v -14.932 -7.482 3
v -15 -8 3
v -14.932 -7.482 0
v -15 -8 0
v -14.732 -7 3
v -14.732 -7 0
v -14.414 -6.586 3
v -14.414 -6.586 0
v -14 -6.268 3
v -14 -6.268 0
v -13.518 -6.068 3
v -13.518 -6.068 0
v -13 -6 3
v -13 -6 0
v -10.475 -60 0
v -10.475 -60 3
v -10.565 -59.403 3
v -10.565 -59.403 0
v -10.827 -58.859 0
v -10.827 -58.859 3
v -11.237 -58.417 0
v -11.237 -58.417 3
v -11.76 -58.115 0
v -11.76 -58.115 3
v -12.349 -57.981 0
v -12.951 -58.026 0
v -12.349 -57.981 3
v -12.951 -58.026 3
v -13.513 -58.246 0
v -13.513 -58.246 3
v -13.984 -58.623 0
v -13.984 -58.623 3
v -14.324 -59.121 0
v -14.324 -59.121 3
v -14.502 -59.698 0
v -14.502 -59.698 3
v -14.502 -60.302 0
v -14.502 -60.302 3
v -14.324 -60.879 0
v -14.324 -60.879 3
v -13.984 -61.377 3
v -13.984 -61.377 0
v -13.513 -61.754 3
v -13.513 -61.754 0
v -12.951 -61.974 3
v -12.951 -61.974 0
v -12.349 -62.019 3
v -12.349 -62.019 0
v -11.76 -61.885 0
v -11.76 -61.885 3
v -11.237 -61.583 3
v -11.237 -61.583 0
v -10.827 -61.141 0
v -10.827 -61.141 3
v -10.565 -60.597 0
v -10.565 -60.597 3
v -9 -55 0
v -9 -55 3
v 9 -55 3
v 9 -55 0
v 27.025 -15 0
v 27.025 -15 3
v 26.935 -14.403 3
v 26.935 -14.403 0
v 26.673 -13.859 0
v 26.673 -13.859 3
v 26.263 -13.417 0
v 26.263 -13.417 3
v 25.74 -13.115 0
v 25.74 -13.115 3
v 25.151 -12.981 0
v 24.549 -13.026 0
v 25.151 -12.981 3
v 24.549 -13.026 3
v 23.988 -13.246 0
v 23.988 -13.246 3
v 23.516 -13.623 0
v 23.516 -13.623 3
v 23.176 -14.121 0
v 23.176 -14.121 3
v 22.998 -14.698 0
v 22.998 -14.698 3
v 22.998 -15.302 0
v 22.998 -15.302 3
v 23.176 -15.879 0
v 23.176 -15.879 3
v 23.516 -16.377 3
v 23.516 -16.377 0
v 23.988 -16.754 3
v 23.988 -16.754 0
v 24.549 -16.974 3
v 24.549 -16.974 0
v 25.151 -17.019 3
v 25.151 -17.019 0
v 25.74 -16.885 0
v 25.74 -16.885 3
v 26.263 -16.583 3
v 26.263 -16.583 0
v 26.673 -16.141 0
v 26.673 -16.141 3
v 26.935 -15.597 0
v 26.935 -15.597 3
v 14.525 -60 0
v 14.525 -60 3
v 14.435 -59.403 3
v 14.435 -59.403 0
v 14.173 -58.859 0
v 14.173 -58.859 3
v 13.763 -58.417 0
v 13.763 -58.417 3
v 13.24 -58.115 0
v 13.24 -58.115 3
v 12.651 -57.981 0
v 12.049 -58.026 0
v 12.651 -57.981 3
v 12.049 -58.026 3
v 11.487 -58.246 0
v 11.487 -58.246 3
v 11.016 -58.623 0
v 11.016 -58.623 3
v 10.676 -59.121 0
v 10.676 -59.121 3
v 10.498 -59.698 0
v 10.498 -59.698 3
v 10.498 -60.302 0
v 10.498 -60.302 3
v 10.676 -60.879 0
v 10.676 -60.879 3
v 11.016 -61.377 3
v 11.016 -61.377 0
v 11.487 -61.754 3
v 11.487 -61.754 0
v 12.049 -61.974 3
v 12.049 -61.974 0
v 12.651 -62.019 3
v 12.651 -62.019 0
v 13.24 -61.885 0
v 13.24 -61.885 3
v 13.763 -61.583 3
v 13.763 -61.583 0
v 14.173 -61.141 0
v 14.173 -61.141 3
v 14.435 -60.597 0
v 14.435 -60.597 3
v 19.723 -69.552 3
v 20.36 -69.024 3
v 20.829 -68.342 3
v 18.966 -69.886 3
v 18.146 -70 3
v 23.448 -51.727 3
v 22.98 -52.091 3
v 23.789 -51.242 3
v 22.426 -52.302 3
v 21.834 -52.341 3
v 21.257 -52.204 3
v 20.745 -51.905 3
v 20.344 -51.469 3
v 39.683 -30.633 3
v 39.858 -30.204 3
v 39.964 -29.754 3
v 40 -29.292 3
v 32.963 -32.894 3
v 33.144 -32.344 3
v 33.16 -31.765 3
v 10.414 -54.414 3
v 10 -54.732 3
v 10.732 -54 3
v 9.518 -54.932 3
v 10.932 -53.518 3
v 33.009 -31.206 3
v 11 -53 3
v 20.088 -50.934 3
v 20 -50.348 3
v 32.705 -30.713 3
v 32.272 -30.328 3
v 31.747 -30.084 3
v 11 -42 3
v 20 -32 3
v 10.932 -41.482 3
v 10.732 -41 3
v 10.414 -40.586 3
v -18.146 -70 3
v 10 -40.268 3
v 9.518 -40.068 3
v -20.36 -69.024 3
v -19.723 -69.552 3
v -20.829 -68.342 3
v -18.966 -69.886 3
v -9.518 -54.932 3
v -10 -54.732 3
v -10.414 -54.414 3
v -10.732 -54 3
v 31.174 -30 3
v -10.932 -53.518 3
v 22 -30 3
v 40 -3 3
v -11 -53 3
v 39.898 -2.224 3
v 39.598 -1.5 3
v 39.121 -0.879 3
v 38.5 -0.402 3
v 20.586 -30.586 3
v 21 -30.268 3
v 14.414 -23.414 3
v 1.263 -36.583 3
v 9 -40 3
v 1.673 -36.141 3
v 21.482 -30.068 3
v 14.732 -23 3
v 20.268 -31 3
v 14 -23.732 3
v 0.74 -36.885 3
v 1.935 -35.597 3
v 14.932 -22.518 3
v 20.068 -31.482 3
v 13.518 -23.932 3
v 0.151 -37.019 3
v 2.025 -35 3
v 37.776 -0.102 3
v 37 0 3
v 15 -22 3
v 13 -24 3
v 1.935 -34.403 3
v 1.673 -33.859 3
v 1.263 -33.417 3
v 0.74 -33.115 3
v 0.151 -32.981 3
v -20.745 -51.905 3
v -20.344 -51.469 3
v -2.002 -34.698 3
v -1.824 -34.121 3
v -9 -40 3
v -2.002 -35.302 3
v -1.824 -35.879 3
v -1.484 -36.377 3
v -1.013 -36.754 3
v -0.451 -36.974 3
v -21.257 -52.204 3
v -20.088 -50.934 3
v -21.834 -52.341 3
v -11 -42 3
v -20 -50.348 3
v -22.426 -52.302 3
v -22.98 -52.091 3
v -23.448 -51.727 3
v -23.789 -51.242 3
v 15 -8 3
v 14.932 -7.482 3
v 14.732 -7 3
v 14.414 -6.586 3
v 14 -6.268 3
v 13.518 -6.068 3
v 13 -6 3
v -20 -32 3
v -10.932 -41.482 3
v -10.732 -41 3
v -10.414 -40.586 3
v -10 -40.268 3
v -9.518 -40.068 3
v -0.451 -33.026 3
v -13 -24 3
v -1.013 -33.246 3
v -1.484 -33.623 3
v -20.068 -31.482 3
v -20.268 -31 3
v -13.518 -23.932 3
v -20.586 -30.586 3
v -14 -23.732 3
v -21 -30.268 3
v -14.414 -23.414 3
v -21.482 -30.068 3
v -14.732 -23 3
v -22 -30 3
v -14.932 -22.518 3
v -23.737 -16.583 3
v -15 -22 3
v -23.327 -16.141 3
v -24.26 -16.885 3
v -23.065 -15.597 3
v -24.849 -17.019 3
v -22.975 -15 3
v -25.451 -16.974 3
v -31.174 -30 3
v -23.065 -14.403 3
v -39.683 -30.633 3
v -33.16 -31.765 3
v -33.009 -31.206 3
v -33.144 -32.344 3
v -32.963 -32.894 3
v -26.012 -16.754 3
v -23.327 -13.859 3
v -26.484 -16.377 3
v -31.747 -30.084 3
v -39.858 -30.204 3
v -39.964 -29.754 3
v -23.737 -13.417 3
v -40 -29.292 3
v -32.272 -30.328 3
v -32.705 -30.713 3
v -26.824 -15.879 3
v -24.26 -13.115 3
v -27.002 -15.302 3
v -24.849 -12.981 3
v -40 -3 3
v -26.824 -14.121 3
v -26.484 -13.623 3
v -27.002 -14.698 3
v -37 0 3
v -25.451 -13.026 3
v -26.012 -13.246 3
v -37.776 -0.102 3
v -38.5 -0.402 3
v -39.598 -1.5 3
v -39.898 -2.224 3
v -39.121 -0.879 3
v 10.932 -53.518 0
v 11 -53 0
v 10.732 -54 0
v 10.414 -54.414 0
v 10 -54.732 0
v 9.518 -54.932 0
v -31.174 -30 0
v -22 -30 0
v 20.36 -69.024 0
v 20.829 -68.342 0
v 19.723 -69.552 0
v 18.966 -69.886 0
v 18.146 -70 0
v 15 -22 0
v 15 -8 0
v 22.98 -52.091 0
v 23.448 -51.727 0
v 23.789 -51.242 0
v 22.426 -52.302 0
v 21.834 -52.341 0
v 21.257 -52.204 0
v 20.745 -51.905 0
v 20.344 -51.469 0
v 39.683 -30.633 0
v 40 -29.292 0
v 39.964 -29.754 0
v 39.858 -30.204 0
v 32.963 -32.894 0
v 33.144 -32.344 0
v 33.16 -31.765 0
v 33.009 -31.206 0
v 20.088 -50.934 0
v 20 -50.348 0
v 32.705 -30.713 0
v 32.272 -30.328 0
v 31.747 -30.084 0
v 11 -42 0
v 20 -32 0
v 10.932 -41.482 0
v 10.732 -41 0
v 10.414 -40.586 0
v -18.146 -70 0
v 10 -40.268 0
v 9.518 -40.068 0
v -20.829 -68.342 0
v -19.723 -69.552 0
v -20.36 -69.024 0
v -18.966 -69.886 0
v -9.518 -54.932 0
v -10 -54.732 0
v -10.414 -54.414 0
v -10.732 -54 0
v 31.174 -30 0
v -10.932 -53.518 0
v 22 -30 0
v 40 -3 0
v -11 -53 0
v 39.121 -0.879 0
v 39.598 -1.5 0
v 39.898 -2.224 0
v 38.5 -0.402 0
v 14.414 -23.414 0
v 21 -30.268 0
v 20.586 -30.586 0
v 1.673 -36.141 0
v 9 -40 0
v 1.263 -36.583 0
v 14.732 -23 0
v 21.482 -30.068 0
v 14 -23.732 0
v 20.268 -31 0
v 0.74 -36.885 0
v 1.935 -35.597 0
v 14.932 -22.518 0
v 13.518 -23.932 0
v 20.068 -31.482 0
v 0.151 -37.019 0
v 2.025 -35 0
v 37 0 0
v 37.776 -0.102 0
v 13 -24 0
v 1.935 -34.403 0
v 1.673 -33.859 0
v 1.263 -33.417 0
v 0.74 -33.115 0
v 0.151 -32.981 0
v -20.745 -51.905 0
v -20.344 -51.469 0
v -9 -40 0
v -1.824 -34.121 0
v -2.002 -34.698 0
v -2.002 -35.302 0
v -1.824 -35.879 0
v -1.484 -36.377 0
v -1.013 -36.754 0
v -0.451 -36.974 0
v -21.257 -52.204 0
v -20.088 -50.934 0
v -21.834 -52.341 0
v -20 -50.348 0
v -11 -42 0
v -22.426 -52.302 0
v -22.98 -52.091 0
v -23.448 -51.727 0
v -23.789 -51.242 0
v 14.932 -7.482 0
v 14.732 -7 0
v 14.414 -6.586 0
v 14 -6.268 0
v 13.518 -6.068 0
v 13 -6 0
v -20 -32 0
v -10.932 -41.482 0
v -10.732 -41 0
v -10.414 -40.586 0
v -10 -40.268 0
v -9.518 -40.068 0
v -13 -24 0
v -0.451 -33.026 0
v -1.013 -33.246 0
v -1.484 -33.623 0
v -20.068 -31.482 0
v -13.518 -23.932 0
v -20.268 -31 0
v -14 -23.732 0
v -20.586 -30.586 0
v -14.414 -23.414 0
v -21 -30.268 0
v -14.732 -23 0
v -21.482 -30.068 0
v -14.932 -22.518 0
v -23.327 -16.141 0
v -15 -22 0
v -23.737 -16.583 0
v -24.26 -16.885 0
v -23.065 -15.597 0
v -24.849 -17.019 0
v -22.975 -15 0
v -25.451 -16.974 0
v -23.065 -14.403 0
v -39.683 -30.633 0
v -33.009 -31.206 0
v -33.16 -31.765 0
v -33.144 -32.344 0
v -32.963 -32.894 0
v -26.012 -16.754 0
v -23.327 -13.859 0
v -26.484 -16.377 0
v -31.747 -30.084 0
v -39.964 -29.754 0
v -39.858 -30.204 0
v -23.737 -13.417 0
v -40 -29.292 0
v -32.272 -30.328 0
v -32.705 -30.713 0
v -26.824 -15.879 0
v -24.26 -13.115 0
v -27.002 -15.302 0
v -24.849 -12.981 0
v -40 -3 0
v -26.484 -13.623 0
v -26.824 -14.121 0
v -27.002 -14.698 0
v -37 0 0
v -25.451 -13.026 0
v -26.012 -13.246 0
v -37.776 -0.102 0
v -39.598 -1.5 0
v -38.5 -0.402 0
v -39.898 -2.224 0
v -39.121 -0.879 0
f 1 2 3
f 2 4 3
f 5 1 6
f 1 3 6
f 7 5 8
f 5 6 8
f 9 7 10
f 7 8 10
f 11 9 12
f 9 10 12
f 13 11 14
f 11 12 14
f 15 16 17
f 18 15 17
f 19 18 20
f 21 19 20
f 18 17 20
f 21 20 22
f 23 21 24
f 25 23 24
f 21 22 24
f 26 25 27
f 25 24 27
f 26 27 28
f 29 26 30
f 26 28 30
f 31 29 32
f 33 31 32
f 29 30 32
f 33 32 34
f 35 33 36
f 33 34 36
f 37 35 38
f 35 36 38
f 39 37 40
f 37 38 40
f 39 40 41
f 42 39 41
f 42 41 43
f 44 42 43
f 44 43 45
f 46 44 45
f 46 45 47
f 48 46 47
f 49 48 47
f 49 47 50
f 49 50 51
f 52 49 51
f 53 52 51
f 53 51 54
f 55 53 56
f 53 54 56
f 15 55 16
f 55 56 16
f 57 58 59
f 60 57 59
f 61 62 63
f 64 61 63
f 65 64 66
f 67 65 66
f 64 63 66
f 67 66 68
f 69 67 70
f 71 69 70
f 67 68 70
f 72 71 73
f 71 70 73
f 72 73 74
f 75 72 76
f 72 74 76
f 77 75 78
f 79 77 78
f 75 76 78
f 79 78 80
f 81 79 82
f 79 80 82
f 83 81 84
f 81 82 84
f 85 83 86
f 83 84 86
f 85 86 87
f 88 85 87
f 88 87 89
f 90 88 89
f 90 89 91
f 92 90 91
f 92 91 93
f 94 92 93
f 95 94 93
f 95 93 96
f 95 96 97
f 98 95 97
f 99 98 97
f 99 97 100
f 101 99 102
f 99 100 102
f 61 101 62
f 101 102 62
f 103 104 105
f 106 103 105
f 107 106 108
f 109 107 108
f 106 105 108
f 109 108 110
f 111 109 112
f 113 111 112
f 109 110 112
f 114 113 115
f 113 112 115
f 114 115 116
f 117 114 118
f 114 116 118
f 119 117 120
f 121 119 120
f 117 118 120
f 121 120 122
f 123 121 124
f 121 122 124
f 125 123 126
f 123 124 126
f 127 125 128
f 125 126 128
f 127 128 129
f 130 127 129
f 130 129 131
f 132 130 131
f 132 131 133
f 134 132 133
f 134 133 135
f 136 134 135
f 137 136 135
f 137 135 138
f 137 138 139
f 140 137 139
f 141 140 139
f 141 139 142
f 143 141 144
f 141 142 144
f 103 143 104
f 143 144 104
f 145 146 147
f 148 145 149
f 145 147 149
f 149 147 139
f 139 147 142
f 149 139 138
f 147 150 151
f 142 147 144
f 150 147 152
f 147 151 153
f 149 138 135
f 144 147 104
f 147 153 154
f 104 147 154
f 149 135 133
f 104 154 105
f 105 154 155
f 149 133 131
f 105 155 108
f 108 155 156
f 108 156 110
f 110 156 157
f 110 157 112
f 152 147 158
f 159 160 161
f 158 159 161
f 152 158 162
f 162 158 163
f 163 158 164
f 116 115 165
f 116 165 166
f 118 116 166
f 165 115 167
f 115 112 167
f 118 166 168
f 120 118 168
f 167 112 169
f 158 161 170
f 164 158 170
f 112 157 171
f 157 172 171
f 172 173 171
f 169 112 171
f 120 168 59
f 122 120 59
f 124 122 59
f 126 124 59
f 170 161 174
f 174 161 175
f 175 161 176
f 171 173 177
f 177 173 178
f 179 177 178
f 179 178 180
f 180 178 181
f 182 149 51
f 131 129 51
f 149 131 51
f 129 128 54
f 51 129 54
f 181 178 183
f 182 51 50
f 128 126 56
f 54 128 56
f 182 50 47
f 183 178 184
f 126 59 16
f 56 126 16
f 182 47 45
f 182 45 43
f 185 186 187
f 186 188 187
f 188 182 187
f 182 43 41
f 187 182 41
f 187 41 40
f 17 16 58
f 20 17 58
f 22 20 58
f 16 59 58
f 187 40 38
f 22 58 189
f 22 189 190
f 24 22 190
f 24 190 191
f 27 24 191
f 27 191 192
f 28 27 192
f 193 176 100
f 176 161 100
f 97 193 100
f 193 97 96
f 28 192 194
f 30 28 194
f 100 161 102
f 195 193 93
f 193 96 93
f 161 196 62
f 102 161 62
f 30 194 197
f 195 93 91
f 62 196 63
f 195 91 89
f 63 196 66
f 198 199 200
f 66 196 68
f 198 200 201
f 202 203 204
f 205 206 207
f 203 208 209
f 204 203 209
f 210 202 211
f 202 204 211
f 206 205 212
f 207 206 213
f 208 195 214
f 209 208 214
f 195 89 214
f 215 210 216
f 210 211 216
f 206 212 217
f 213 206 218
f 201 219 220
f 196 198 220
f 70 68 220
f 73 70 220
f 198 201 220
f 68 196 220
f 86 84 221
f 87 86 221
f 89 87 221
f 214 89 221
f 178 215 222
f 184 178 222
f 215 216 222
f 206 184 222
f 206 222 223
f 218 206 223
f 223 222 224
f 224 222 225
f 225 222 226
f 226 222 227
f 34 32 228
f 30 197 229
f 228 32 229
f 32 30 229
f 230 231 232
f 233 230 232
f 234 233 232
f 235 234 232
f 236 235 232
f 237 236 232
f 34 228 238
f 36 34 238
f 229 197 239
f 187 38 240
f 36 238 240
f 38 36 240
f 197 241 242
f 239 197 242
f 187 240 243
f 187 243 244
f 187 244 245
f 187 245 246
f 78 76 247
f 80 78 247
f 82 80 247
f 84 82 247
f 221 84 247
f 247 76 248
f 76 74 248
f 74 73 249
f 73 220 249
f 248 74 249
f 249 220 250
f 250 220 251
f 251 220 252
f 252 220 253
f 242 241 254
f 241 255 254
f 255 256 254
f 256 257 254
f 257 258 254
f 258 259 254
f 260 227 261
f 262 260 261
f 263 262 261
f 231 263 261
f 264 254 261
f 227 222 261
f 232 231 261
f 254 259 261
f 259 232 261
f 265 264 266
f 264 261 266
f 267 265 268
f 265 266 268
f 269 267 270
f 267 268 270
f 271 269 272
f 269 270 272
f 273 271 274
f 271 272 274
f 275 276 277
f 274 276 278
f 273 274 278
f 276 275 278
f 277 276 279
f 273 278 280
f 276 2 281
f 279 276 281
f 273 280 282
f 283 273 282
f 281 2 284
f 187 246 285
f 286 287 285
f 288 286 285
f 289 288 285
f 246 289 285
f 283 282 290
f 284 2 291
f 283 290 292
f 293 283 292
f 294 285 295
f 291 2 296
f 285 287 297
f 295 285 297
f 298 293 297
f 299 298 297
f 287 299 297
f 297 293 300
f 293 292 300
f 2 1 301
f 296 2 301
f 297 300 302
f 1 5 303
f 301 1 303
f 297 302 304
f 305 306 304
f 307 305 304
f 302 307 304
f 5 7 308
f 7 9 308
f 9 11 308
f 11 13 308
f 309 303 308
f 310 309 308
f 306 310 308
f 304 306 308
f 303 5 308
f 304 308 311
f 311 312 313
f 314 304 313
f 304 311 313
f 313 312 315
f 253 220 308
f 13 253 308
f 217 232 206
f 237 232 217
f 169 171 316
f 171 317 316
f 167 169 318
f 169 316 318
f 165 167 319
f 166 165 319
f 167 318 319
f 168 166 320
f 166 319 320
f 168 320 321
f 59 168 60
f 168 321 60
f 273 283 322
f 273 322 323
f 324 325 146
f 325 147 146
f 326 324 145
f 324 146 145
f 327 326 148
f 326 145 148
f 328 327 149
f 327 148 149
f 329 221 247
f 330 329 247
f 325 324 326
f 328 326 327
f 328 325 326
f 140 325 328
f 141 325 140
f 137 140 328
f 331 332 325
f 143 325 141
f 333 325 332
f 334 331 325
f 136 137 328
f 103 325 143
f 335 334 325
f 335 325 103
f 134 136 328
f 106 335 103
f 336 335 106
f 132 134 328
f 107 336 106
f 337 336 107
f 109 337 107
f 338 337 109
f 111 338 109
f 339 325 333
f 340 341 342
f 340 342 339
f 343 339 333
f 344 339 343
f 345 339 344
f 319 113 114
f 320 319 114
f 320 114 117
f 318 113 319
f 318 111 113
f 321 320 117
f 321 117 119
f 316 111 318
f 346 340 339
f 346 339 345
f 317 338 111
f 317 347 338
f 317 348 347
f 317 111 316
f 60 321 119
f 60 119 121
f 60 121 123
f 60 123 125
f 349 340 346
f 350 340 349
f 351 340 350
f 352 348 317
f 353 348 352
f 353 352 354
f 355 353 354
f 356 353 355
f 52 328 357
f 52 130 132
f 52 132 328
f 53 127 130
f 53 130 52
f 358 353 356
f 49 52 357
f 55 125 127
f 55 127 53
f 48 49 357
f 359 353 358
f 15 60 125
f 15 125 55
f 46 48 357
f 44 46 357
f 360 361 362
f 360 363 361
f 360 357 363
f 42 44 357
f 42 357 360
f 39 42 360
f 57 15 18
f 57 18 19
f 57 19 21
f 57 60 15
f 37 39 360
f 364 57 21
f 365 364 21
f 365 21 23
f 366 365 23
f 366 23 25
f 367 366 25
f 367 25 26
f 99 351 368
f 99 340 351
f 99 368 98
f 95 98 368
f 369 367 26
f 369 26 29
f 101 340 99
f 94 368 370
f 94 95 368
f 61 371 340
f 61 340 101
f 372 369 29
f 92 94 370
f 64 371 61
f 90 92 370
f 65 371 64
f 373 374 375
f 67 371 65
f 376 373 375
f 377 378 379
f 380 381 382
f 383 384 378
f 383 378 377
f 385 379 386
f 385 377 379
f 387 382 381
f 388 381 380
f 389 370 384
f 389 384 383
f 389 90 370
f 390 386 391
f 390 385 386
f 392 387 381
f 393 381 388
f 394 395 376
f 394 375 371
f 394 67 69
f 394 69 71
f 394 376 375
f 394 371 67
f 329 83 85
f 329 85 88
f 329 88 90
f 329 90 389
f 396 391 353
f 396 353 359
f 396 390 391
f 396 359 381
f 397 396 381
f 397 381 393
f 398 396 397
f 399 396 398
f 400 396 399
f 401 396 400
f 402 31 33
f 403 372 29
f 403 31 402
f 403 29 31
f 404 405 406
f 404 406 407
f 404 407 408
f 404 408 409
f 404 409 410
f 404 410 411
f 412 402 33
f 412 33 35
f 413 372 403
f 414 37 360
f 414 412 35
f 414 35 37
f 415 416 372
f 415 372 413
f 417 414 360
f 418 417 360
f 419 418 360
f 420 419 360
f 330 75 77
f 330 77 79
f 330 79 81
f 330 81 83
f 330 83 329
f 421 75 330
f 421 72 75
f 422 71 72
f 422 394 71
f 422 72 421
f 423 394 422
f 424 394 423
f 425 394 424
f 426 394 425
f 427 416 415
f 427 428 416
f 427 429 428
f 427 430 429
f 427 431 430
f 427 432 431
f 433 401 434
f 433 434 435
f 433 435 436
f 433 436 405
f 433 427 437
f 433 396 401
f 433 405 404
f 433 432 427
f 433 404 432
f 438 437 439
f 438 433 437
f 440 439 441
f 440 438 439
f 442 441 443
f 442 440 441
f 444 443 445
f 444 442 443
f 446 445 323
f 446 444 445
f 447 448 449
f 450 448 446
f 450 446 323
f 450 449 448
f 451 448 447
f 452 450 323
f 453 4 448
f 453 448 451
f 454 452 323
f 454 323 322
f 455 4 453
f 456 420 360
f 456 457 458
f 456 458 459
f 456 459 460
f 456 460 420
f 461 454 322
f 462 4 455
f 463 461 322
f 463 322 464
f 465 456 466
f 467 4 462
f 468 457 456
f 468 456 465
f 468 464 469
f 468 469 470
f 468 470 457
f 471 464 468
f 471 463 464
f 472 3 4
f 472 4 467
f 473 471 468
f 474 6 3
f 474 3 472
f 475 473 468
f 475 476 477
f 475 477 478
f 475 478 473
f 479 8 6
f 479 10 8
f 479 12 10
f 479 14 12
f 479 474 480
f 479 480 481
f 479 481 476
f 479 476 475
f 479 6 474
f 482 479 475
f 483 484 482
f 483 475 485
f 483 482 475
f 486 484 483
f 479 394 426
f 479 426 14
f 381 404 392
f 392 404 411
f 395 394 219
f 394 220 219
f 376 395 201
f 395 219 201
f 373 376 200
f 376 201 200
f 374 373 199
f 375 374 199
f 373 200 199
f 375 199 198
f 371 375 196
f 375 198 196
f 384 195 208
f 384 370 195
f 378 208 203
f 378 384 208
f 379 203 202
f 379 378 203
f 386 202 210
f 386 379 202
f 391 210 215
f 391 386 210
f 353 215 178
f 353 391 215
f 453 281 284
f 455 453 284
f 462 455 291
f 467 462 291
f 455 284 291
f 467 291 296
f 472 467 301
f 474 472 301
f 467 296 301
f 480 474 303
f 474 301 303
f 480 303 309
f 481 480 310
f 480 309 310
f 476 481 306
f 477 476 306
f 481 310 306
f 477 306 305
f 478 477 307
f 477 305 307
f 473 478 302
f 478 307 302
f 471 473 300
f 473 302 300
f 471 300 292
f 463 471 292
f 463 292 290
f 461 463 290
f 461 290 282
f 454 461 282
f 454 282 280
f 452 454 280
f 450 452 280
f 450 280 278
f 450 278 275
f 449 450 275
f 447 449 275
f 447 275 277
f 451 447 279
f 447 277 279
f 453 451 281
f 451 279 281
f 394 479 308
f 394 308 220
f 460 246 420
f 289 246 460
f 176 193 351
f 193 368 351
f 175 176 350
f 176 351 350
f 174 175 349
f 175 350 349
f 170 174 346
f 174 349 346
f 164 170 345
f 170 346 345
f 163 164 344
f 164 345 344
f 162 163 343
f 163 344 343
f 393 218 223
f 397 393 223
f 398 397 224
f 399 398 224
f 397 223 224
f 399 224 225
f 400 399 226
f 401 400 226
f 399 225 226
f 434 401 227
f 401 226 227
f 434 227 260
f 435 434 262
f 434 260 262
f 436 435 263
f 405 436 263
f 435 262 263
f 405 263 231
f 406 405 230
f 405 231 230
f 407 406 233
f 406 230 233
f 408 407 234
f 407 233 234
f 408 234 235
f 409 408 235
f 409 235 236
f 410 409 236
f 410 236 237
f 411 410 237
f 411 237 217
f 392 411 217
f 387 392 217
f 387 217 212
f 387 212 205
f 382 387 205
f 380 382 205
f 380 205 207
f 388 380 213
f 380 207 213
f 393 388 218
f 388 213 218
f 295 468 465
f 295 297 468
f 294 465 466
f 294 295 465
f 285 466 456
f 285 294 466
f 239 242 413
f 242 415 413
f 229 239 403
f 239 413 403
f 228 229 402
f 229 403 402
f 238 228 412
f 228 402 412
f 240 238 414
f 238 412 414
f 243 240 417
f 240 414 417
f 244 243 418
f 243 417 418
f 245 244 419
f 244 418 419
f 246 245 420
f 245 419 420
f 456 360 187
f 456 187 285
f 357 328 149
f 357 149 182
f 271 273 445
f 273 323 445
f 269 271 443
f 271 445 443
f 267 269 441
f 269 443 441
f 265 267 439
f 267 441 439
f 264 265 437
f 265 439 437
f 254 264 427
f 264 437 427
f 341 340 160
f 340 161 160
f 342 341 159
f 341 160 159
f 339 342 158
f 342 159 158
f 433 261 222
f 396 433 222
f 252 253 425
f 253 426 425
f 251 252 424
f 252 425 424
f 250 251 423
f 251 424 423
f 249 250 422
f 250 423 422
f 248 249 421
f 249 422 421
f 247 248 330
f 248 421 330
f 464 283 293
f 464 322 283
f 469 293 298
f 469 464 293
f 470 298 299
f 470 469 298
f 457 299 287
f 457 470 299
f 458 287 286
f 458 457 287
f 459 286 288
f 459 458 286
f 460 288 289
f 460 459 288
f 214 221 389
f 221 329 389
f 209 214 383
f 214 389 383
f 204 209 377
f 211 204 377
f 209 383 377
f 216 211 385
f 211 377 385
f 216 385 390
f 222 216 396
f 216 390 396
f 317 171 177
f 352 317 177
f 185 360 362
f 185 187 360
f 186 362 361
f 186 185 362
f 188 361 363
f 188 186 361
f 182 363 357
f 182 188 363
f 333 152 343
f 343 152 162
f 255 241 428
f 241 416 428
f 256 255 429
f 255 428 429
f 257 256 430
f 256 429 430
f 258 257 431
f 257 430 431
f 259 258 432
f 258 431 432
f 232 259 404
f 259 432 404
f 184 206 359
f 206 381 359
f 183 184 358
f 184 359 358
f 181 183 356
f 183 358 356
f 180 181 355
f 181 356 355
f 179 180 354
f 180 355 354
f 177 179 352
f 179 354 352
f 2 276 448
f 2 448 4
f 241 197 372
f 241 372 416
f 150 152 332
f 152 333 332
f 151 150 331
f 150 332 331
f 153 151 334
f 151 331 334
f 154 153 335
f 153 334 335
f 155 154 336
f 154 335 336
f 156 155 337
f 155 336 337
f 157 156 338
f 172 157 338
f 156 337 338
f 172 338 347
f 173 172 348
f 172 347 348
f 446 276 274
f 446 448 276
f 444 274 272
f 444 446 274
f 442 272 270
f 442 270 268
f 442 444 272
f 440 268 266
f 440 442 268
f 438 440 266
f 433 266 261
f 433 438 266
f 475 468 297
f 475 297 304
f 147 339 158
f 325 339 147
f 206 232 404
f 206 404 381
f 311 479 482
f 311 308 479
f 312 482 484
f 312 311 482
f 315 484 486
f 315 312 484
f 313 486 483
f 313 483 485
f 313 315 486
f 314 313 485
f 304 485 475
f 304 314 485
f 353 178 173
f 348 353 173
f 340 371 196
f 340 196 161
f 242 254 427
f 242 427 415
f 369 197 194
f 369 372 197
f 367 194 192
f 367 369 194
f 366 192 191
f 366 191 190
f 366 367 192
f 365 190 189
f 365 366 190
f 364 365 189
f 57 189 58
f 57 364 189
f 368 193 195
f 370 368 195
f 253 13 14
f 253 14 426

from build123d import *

# Parameters (mm, degrees)
EXTRUDE_1_DEPTH     = 3
SKETCH_2_R          = 2.025
CUT_EXTRUDE_1_DEPTH = 3
SKETCH_3_W          = 30
SKETCH_3_H          = 18
SKETCH_3_W_2        = 22
SKETCH_3_H_2        = 15
CUT_EXTRUDE_2_DEPTH = 3
FILLET_1_R          = 2
FILLET_2_R          = 3


with BuildPart() as part:
    # 草图1 → 凸台-拉伸1 (new body)
    with BuildSketch(Plane.XY):
        Polygon((-40, 0), (40, 0), (40, -30), (20, -70), (-20, -70), (-40, -30), align=None)
    extrude(amount=EXTRUDE_1_DEPTH)

    # 草图2 → 切除-拉伸1 (cut)
    with BuildSketch(Plane.XY.offset(3)):
        with Locations((-25, -15)):
            Circle(SKETCH_2_R)
        with Locations((25, -15)):
            Circle(SKETCH_2_R)
        with Locations((0, -35)):
            Circle(SKETCH_2_R)
        with Locations((12.5, -60)):
            Circle(SKETCH_2_R)
        with Locations((-12.5, -60)):
            Circle(SKETCH_2_R)
    extrude(amount=-CUT_EXTRUDE_1_DEPTH, mode=Mode.SUBTRACT)

    # 草图3 → 切除-拉伸2 (cut)
    with BuildSketch(Plane.XY.offset(3)):
        Polygon((-34.409830056, -30), (-20, -30), (-20, -58.819660113), align=None)
        with Locations((0, -15)):
            Rectangle(SKETCH_3_W, SKETCH_3_H)
        with Locations((0, -47.5)):
            Rectangle(SKETCH_3_W_2, SKETCH_3_H_2)
        Polygon((20, -30), (20, -58.819660113), (34.409830056, -30), align=None)
    extrude(amount=-CUT_EXTRUDE_2_DEPTH, mode=Mode.SUBTRACT)

    # 圆角1
    fillet_1_edges = [part.edges().sort_by_distance(p)[0] for p in [
        (15, -24, 1.5),
        (-15, -24, 1.5),
        (-15, -6, 1.5),
        (15, -6, 1.5),
        (-20, -58.819660113, 1.5),
        (-34.409830056, -30, 1.5),
        (-20, -30, 1.5),
        (11, -55, 1.5),
        (-11, -55, 1.5),
        (-11, -40, 1.5),
        (11, -40, 1.5),
        (34.409830056, -30, 1.5),
        (20, -58.819660113, 1.5),
        (20, -30, 1.5),
    ]]
    fillet(fillet_1_edges, radius=FILLET_1_R)

    # 圆角2
    fillet_2_edges = [part.edges().sort_by_distance(p)[0] for p in [
        (-40, 0, 1.5),
        (40, 0, 1.5),
        (40, -30, 1.5),
        (20, -70, 1.5),
        (-20, -70, 1.5),
        (-40, -30, 1.5),
    ]]
    fillet(fillet_2_edges, radius=FILLET_2_R)


solid = part.part
